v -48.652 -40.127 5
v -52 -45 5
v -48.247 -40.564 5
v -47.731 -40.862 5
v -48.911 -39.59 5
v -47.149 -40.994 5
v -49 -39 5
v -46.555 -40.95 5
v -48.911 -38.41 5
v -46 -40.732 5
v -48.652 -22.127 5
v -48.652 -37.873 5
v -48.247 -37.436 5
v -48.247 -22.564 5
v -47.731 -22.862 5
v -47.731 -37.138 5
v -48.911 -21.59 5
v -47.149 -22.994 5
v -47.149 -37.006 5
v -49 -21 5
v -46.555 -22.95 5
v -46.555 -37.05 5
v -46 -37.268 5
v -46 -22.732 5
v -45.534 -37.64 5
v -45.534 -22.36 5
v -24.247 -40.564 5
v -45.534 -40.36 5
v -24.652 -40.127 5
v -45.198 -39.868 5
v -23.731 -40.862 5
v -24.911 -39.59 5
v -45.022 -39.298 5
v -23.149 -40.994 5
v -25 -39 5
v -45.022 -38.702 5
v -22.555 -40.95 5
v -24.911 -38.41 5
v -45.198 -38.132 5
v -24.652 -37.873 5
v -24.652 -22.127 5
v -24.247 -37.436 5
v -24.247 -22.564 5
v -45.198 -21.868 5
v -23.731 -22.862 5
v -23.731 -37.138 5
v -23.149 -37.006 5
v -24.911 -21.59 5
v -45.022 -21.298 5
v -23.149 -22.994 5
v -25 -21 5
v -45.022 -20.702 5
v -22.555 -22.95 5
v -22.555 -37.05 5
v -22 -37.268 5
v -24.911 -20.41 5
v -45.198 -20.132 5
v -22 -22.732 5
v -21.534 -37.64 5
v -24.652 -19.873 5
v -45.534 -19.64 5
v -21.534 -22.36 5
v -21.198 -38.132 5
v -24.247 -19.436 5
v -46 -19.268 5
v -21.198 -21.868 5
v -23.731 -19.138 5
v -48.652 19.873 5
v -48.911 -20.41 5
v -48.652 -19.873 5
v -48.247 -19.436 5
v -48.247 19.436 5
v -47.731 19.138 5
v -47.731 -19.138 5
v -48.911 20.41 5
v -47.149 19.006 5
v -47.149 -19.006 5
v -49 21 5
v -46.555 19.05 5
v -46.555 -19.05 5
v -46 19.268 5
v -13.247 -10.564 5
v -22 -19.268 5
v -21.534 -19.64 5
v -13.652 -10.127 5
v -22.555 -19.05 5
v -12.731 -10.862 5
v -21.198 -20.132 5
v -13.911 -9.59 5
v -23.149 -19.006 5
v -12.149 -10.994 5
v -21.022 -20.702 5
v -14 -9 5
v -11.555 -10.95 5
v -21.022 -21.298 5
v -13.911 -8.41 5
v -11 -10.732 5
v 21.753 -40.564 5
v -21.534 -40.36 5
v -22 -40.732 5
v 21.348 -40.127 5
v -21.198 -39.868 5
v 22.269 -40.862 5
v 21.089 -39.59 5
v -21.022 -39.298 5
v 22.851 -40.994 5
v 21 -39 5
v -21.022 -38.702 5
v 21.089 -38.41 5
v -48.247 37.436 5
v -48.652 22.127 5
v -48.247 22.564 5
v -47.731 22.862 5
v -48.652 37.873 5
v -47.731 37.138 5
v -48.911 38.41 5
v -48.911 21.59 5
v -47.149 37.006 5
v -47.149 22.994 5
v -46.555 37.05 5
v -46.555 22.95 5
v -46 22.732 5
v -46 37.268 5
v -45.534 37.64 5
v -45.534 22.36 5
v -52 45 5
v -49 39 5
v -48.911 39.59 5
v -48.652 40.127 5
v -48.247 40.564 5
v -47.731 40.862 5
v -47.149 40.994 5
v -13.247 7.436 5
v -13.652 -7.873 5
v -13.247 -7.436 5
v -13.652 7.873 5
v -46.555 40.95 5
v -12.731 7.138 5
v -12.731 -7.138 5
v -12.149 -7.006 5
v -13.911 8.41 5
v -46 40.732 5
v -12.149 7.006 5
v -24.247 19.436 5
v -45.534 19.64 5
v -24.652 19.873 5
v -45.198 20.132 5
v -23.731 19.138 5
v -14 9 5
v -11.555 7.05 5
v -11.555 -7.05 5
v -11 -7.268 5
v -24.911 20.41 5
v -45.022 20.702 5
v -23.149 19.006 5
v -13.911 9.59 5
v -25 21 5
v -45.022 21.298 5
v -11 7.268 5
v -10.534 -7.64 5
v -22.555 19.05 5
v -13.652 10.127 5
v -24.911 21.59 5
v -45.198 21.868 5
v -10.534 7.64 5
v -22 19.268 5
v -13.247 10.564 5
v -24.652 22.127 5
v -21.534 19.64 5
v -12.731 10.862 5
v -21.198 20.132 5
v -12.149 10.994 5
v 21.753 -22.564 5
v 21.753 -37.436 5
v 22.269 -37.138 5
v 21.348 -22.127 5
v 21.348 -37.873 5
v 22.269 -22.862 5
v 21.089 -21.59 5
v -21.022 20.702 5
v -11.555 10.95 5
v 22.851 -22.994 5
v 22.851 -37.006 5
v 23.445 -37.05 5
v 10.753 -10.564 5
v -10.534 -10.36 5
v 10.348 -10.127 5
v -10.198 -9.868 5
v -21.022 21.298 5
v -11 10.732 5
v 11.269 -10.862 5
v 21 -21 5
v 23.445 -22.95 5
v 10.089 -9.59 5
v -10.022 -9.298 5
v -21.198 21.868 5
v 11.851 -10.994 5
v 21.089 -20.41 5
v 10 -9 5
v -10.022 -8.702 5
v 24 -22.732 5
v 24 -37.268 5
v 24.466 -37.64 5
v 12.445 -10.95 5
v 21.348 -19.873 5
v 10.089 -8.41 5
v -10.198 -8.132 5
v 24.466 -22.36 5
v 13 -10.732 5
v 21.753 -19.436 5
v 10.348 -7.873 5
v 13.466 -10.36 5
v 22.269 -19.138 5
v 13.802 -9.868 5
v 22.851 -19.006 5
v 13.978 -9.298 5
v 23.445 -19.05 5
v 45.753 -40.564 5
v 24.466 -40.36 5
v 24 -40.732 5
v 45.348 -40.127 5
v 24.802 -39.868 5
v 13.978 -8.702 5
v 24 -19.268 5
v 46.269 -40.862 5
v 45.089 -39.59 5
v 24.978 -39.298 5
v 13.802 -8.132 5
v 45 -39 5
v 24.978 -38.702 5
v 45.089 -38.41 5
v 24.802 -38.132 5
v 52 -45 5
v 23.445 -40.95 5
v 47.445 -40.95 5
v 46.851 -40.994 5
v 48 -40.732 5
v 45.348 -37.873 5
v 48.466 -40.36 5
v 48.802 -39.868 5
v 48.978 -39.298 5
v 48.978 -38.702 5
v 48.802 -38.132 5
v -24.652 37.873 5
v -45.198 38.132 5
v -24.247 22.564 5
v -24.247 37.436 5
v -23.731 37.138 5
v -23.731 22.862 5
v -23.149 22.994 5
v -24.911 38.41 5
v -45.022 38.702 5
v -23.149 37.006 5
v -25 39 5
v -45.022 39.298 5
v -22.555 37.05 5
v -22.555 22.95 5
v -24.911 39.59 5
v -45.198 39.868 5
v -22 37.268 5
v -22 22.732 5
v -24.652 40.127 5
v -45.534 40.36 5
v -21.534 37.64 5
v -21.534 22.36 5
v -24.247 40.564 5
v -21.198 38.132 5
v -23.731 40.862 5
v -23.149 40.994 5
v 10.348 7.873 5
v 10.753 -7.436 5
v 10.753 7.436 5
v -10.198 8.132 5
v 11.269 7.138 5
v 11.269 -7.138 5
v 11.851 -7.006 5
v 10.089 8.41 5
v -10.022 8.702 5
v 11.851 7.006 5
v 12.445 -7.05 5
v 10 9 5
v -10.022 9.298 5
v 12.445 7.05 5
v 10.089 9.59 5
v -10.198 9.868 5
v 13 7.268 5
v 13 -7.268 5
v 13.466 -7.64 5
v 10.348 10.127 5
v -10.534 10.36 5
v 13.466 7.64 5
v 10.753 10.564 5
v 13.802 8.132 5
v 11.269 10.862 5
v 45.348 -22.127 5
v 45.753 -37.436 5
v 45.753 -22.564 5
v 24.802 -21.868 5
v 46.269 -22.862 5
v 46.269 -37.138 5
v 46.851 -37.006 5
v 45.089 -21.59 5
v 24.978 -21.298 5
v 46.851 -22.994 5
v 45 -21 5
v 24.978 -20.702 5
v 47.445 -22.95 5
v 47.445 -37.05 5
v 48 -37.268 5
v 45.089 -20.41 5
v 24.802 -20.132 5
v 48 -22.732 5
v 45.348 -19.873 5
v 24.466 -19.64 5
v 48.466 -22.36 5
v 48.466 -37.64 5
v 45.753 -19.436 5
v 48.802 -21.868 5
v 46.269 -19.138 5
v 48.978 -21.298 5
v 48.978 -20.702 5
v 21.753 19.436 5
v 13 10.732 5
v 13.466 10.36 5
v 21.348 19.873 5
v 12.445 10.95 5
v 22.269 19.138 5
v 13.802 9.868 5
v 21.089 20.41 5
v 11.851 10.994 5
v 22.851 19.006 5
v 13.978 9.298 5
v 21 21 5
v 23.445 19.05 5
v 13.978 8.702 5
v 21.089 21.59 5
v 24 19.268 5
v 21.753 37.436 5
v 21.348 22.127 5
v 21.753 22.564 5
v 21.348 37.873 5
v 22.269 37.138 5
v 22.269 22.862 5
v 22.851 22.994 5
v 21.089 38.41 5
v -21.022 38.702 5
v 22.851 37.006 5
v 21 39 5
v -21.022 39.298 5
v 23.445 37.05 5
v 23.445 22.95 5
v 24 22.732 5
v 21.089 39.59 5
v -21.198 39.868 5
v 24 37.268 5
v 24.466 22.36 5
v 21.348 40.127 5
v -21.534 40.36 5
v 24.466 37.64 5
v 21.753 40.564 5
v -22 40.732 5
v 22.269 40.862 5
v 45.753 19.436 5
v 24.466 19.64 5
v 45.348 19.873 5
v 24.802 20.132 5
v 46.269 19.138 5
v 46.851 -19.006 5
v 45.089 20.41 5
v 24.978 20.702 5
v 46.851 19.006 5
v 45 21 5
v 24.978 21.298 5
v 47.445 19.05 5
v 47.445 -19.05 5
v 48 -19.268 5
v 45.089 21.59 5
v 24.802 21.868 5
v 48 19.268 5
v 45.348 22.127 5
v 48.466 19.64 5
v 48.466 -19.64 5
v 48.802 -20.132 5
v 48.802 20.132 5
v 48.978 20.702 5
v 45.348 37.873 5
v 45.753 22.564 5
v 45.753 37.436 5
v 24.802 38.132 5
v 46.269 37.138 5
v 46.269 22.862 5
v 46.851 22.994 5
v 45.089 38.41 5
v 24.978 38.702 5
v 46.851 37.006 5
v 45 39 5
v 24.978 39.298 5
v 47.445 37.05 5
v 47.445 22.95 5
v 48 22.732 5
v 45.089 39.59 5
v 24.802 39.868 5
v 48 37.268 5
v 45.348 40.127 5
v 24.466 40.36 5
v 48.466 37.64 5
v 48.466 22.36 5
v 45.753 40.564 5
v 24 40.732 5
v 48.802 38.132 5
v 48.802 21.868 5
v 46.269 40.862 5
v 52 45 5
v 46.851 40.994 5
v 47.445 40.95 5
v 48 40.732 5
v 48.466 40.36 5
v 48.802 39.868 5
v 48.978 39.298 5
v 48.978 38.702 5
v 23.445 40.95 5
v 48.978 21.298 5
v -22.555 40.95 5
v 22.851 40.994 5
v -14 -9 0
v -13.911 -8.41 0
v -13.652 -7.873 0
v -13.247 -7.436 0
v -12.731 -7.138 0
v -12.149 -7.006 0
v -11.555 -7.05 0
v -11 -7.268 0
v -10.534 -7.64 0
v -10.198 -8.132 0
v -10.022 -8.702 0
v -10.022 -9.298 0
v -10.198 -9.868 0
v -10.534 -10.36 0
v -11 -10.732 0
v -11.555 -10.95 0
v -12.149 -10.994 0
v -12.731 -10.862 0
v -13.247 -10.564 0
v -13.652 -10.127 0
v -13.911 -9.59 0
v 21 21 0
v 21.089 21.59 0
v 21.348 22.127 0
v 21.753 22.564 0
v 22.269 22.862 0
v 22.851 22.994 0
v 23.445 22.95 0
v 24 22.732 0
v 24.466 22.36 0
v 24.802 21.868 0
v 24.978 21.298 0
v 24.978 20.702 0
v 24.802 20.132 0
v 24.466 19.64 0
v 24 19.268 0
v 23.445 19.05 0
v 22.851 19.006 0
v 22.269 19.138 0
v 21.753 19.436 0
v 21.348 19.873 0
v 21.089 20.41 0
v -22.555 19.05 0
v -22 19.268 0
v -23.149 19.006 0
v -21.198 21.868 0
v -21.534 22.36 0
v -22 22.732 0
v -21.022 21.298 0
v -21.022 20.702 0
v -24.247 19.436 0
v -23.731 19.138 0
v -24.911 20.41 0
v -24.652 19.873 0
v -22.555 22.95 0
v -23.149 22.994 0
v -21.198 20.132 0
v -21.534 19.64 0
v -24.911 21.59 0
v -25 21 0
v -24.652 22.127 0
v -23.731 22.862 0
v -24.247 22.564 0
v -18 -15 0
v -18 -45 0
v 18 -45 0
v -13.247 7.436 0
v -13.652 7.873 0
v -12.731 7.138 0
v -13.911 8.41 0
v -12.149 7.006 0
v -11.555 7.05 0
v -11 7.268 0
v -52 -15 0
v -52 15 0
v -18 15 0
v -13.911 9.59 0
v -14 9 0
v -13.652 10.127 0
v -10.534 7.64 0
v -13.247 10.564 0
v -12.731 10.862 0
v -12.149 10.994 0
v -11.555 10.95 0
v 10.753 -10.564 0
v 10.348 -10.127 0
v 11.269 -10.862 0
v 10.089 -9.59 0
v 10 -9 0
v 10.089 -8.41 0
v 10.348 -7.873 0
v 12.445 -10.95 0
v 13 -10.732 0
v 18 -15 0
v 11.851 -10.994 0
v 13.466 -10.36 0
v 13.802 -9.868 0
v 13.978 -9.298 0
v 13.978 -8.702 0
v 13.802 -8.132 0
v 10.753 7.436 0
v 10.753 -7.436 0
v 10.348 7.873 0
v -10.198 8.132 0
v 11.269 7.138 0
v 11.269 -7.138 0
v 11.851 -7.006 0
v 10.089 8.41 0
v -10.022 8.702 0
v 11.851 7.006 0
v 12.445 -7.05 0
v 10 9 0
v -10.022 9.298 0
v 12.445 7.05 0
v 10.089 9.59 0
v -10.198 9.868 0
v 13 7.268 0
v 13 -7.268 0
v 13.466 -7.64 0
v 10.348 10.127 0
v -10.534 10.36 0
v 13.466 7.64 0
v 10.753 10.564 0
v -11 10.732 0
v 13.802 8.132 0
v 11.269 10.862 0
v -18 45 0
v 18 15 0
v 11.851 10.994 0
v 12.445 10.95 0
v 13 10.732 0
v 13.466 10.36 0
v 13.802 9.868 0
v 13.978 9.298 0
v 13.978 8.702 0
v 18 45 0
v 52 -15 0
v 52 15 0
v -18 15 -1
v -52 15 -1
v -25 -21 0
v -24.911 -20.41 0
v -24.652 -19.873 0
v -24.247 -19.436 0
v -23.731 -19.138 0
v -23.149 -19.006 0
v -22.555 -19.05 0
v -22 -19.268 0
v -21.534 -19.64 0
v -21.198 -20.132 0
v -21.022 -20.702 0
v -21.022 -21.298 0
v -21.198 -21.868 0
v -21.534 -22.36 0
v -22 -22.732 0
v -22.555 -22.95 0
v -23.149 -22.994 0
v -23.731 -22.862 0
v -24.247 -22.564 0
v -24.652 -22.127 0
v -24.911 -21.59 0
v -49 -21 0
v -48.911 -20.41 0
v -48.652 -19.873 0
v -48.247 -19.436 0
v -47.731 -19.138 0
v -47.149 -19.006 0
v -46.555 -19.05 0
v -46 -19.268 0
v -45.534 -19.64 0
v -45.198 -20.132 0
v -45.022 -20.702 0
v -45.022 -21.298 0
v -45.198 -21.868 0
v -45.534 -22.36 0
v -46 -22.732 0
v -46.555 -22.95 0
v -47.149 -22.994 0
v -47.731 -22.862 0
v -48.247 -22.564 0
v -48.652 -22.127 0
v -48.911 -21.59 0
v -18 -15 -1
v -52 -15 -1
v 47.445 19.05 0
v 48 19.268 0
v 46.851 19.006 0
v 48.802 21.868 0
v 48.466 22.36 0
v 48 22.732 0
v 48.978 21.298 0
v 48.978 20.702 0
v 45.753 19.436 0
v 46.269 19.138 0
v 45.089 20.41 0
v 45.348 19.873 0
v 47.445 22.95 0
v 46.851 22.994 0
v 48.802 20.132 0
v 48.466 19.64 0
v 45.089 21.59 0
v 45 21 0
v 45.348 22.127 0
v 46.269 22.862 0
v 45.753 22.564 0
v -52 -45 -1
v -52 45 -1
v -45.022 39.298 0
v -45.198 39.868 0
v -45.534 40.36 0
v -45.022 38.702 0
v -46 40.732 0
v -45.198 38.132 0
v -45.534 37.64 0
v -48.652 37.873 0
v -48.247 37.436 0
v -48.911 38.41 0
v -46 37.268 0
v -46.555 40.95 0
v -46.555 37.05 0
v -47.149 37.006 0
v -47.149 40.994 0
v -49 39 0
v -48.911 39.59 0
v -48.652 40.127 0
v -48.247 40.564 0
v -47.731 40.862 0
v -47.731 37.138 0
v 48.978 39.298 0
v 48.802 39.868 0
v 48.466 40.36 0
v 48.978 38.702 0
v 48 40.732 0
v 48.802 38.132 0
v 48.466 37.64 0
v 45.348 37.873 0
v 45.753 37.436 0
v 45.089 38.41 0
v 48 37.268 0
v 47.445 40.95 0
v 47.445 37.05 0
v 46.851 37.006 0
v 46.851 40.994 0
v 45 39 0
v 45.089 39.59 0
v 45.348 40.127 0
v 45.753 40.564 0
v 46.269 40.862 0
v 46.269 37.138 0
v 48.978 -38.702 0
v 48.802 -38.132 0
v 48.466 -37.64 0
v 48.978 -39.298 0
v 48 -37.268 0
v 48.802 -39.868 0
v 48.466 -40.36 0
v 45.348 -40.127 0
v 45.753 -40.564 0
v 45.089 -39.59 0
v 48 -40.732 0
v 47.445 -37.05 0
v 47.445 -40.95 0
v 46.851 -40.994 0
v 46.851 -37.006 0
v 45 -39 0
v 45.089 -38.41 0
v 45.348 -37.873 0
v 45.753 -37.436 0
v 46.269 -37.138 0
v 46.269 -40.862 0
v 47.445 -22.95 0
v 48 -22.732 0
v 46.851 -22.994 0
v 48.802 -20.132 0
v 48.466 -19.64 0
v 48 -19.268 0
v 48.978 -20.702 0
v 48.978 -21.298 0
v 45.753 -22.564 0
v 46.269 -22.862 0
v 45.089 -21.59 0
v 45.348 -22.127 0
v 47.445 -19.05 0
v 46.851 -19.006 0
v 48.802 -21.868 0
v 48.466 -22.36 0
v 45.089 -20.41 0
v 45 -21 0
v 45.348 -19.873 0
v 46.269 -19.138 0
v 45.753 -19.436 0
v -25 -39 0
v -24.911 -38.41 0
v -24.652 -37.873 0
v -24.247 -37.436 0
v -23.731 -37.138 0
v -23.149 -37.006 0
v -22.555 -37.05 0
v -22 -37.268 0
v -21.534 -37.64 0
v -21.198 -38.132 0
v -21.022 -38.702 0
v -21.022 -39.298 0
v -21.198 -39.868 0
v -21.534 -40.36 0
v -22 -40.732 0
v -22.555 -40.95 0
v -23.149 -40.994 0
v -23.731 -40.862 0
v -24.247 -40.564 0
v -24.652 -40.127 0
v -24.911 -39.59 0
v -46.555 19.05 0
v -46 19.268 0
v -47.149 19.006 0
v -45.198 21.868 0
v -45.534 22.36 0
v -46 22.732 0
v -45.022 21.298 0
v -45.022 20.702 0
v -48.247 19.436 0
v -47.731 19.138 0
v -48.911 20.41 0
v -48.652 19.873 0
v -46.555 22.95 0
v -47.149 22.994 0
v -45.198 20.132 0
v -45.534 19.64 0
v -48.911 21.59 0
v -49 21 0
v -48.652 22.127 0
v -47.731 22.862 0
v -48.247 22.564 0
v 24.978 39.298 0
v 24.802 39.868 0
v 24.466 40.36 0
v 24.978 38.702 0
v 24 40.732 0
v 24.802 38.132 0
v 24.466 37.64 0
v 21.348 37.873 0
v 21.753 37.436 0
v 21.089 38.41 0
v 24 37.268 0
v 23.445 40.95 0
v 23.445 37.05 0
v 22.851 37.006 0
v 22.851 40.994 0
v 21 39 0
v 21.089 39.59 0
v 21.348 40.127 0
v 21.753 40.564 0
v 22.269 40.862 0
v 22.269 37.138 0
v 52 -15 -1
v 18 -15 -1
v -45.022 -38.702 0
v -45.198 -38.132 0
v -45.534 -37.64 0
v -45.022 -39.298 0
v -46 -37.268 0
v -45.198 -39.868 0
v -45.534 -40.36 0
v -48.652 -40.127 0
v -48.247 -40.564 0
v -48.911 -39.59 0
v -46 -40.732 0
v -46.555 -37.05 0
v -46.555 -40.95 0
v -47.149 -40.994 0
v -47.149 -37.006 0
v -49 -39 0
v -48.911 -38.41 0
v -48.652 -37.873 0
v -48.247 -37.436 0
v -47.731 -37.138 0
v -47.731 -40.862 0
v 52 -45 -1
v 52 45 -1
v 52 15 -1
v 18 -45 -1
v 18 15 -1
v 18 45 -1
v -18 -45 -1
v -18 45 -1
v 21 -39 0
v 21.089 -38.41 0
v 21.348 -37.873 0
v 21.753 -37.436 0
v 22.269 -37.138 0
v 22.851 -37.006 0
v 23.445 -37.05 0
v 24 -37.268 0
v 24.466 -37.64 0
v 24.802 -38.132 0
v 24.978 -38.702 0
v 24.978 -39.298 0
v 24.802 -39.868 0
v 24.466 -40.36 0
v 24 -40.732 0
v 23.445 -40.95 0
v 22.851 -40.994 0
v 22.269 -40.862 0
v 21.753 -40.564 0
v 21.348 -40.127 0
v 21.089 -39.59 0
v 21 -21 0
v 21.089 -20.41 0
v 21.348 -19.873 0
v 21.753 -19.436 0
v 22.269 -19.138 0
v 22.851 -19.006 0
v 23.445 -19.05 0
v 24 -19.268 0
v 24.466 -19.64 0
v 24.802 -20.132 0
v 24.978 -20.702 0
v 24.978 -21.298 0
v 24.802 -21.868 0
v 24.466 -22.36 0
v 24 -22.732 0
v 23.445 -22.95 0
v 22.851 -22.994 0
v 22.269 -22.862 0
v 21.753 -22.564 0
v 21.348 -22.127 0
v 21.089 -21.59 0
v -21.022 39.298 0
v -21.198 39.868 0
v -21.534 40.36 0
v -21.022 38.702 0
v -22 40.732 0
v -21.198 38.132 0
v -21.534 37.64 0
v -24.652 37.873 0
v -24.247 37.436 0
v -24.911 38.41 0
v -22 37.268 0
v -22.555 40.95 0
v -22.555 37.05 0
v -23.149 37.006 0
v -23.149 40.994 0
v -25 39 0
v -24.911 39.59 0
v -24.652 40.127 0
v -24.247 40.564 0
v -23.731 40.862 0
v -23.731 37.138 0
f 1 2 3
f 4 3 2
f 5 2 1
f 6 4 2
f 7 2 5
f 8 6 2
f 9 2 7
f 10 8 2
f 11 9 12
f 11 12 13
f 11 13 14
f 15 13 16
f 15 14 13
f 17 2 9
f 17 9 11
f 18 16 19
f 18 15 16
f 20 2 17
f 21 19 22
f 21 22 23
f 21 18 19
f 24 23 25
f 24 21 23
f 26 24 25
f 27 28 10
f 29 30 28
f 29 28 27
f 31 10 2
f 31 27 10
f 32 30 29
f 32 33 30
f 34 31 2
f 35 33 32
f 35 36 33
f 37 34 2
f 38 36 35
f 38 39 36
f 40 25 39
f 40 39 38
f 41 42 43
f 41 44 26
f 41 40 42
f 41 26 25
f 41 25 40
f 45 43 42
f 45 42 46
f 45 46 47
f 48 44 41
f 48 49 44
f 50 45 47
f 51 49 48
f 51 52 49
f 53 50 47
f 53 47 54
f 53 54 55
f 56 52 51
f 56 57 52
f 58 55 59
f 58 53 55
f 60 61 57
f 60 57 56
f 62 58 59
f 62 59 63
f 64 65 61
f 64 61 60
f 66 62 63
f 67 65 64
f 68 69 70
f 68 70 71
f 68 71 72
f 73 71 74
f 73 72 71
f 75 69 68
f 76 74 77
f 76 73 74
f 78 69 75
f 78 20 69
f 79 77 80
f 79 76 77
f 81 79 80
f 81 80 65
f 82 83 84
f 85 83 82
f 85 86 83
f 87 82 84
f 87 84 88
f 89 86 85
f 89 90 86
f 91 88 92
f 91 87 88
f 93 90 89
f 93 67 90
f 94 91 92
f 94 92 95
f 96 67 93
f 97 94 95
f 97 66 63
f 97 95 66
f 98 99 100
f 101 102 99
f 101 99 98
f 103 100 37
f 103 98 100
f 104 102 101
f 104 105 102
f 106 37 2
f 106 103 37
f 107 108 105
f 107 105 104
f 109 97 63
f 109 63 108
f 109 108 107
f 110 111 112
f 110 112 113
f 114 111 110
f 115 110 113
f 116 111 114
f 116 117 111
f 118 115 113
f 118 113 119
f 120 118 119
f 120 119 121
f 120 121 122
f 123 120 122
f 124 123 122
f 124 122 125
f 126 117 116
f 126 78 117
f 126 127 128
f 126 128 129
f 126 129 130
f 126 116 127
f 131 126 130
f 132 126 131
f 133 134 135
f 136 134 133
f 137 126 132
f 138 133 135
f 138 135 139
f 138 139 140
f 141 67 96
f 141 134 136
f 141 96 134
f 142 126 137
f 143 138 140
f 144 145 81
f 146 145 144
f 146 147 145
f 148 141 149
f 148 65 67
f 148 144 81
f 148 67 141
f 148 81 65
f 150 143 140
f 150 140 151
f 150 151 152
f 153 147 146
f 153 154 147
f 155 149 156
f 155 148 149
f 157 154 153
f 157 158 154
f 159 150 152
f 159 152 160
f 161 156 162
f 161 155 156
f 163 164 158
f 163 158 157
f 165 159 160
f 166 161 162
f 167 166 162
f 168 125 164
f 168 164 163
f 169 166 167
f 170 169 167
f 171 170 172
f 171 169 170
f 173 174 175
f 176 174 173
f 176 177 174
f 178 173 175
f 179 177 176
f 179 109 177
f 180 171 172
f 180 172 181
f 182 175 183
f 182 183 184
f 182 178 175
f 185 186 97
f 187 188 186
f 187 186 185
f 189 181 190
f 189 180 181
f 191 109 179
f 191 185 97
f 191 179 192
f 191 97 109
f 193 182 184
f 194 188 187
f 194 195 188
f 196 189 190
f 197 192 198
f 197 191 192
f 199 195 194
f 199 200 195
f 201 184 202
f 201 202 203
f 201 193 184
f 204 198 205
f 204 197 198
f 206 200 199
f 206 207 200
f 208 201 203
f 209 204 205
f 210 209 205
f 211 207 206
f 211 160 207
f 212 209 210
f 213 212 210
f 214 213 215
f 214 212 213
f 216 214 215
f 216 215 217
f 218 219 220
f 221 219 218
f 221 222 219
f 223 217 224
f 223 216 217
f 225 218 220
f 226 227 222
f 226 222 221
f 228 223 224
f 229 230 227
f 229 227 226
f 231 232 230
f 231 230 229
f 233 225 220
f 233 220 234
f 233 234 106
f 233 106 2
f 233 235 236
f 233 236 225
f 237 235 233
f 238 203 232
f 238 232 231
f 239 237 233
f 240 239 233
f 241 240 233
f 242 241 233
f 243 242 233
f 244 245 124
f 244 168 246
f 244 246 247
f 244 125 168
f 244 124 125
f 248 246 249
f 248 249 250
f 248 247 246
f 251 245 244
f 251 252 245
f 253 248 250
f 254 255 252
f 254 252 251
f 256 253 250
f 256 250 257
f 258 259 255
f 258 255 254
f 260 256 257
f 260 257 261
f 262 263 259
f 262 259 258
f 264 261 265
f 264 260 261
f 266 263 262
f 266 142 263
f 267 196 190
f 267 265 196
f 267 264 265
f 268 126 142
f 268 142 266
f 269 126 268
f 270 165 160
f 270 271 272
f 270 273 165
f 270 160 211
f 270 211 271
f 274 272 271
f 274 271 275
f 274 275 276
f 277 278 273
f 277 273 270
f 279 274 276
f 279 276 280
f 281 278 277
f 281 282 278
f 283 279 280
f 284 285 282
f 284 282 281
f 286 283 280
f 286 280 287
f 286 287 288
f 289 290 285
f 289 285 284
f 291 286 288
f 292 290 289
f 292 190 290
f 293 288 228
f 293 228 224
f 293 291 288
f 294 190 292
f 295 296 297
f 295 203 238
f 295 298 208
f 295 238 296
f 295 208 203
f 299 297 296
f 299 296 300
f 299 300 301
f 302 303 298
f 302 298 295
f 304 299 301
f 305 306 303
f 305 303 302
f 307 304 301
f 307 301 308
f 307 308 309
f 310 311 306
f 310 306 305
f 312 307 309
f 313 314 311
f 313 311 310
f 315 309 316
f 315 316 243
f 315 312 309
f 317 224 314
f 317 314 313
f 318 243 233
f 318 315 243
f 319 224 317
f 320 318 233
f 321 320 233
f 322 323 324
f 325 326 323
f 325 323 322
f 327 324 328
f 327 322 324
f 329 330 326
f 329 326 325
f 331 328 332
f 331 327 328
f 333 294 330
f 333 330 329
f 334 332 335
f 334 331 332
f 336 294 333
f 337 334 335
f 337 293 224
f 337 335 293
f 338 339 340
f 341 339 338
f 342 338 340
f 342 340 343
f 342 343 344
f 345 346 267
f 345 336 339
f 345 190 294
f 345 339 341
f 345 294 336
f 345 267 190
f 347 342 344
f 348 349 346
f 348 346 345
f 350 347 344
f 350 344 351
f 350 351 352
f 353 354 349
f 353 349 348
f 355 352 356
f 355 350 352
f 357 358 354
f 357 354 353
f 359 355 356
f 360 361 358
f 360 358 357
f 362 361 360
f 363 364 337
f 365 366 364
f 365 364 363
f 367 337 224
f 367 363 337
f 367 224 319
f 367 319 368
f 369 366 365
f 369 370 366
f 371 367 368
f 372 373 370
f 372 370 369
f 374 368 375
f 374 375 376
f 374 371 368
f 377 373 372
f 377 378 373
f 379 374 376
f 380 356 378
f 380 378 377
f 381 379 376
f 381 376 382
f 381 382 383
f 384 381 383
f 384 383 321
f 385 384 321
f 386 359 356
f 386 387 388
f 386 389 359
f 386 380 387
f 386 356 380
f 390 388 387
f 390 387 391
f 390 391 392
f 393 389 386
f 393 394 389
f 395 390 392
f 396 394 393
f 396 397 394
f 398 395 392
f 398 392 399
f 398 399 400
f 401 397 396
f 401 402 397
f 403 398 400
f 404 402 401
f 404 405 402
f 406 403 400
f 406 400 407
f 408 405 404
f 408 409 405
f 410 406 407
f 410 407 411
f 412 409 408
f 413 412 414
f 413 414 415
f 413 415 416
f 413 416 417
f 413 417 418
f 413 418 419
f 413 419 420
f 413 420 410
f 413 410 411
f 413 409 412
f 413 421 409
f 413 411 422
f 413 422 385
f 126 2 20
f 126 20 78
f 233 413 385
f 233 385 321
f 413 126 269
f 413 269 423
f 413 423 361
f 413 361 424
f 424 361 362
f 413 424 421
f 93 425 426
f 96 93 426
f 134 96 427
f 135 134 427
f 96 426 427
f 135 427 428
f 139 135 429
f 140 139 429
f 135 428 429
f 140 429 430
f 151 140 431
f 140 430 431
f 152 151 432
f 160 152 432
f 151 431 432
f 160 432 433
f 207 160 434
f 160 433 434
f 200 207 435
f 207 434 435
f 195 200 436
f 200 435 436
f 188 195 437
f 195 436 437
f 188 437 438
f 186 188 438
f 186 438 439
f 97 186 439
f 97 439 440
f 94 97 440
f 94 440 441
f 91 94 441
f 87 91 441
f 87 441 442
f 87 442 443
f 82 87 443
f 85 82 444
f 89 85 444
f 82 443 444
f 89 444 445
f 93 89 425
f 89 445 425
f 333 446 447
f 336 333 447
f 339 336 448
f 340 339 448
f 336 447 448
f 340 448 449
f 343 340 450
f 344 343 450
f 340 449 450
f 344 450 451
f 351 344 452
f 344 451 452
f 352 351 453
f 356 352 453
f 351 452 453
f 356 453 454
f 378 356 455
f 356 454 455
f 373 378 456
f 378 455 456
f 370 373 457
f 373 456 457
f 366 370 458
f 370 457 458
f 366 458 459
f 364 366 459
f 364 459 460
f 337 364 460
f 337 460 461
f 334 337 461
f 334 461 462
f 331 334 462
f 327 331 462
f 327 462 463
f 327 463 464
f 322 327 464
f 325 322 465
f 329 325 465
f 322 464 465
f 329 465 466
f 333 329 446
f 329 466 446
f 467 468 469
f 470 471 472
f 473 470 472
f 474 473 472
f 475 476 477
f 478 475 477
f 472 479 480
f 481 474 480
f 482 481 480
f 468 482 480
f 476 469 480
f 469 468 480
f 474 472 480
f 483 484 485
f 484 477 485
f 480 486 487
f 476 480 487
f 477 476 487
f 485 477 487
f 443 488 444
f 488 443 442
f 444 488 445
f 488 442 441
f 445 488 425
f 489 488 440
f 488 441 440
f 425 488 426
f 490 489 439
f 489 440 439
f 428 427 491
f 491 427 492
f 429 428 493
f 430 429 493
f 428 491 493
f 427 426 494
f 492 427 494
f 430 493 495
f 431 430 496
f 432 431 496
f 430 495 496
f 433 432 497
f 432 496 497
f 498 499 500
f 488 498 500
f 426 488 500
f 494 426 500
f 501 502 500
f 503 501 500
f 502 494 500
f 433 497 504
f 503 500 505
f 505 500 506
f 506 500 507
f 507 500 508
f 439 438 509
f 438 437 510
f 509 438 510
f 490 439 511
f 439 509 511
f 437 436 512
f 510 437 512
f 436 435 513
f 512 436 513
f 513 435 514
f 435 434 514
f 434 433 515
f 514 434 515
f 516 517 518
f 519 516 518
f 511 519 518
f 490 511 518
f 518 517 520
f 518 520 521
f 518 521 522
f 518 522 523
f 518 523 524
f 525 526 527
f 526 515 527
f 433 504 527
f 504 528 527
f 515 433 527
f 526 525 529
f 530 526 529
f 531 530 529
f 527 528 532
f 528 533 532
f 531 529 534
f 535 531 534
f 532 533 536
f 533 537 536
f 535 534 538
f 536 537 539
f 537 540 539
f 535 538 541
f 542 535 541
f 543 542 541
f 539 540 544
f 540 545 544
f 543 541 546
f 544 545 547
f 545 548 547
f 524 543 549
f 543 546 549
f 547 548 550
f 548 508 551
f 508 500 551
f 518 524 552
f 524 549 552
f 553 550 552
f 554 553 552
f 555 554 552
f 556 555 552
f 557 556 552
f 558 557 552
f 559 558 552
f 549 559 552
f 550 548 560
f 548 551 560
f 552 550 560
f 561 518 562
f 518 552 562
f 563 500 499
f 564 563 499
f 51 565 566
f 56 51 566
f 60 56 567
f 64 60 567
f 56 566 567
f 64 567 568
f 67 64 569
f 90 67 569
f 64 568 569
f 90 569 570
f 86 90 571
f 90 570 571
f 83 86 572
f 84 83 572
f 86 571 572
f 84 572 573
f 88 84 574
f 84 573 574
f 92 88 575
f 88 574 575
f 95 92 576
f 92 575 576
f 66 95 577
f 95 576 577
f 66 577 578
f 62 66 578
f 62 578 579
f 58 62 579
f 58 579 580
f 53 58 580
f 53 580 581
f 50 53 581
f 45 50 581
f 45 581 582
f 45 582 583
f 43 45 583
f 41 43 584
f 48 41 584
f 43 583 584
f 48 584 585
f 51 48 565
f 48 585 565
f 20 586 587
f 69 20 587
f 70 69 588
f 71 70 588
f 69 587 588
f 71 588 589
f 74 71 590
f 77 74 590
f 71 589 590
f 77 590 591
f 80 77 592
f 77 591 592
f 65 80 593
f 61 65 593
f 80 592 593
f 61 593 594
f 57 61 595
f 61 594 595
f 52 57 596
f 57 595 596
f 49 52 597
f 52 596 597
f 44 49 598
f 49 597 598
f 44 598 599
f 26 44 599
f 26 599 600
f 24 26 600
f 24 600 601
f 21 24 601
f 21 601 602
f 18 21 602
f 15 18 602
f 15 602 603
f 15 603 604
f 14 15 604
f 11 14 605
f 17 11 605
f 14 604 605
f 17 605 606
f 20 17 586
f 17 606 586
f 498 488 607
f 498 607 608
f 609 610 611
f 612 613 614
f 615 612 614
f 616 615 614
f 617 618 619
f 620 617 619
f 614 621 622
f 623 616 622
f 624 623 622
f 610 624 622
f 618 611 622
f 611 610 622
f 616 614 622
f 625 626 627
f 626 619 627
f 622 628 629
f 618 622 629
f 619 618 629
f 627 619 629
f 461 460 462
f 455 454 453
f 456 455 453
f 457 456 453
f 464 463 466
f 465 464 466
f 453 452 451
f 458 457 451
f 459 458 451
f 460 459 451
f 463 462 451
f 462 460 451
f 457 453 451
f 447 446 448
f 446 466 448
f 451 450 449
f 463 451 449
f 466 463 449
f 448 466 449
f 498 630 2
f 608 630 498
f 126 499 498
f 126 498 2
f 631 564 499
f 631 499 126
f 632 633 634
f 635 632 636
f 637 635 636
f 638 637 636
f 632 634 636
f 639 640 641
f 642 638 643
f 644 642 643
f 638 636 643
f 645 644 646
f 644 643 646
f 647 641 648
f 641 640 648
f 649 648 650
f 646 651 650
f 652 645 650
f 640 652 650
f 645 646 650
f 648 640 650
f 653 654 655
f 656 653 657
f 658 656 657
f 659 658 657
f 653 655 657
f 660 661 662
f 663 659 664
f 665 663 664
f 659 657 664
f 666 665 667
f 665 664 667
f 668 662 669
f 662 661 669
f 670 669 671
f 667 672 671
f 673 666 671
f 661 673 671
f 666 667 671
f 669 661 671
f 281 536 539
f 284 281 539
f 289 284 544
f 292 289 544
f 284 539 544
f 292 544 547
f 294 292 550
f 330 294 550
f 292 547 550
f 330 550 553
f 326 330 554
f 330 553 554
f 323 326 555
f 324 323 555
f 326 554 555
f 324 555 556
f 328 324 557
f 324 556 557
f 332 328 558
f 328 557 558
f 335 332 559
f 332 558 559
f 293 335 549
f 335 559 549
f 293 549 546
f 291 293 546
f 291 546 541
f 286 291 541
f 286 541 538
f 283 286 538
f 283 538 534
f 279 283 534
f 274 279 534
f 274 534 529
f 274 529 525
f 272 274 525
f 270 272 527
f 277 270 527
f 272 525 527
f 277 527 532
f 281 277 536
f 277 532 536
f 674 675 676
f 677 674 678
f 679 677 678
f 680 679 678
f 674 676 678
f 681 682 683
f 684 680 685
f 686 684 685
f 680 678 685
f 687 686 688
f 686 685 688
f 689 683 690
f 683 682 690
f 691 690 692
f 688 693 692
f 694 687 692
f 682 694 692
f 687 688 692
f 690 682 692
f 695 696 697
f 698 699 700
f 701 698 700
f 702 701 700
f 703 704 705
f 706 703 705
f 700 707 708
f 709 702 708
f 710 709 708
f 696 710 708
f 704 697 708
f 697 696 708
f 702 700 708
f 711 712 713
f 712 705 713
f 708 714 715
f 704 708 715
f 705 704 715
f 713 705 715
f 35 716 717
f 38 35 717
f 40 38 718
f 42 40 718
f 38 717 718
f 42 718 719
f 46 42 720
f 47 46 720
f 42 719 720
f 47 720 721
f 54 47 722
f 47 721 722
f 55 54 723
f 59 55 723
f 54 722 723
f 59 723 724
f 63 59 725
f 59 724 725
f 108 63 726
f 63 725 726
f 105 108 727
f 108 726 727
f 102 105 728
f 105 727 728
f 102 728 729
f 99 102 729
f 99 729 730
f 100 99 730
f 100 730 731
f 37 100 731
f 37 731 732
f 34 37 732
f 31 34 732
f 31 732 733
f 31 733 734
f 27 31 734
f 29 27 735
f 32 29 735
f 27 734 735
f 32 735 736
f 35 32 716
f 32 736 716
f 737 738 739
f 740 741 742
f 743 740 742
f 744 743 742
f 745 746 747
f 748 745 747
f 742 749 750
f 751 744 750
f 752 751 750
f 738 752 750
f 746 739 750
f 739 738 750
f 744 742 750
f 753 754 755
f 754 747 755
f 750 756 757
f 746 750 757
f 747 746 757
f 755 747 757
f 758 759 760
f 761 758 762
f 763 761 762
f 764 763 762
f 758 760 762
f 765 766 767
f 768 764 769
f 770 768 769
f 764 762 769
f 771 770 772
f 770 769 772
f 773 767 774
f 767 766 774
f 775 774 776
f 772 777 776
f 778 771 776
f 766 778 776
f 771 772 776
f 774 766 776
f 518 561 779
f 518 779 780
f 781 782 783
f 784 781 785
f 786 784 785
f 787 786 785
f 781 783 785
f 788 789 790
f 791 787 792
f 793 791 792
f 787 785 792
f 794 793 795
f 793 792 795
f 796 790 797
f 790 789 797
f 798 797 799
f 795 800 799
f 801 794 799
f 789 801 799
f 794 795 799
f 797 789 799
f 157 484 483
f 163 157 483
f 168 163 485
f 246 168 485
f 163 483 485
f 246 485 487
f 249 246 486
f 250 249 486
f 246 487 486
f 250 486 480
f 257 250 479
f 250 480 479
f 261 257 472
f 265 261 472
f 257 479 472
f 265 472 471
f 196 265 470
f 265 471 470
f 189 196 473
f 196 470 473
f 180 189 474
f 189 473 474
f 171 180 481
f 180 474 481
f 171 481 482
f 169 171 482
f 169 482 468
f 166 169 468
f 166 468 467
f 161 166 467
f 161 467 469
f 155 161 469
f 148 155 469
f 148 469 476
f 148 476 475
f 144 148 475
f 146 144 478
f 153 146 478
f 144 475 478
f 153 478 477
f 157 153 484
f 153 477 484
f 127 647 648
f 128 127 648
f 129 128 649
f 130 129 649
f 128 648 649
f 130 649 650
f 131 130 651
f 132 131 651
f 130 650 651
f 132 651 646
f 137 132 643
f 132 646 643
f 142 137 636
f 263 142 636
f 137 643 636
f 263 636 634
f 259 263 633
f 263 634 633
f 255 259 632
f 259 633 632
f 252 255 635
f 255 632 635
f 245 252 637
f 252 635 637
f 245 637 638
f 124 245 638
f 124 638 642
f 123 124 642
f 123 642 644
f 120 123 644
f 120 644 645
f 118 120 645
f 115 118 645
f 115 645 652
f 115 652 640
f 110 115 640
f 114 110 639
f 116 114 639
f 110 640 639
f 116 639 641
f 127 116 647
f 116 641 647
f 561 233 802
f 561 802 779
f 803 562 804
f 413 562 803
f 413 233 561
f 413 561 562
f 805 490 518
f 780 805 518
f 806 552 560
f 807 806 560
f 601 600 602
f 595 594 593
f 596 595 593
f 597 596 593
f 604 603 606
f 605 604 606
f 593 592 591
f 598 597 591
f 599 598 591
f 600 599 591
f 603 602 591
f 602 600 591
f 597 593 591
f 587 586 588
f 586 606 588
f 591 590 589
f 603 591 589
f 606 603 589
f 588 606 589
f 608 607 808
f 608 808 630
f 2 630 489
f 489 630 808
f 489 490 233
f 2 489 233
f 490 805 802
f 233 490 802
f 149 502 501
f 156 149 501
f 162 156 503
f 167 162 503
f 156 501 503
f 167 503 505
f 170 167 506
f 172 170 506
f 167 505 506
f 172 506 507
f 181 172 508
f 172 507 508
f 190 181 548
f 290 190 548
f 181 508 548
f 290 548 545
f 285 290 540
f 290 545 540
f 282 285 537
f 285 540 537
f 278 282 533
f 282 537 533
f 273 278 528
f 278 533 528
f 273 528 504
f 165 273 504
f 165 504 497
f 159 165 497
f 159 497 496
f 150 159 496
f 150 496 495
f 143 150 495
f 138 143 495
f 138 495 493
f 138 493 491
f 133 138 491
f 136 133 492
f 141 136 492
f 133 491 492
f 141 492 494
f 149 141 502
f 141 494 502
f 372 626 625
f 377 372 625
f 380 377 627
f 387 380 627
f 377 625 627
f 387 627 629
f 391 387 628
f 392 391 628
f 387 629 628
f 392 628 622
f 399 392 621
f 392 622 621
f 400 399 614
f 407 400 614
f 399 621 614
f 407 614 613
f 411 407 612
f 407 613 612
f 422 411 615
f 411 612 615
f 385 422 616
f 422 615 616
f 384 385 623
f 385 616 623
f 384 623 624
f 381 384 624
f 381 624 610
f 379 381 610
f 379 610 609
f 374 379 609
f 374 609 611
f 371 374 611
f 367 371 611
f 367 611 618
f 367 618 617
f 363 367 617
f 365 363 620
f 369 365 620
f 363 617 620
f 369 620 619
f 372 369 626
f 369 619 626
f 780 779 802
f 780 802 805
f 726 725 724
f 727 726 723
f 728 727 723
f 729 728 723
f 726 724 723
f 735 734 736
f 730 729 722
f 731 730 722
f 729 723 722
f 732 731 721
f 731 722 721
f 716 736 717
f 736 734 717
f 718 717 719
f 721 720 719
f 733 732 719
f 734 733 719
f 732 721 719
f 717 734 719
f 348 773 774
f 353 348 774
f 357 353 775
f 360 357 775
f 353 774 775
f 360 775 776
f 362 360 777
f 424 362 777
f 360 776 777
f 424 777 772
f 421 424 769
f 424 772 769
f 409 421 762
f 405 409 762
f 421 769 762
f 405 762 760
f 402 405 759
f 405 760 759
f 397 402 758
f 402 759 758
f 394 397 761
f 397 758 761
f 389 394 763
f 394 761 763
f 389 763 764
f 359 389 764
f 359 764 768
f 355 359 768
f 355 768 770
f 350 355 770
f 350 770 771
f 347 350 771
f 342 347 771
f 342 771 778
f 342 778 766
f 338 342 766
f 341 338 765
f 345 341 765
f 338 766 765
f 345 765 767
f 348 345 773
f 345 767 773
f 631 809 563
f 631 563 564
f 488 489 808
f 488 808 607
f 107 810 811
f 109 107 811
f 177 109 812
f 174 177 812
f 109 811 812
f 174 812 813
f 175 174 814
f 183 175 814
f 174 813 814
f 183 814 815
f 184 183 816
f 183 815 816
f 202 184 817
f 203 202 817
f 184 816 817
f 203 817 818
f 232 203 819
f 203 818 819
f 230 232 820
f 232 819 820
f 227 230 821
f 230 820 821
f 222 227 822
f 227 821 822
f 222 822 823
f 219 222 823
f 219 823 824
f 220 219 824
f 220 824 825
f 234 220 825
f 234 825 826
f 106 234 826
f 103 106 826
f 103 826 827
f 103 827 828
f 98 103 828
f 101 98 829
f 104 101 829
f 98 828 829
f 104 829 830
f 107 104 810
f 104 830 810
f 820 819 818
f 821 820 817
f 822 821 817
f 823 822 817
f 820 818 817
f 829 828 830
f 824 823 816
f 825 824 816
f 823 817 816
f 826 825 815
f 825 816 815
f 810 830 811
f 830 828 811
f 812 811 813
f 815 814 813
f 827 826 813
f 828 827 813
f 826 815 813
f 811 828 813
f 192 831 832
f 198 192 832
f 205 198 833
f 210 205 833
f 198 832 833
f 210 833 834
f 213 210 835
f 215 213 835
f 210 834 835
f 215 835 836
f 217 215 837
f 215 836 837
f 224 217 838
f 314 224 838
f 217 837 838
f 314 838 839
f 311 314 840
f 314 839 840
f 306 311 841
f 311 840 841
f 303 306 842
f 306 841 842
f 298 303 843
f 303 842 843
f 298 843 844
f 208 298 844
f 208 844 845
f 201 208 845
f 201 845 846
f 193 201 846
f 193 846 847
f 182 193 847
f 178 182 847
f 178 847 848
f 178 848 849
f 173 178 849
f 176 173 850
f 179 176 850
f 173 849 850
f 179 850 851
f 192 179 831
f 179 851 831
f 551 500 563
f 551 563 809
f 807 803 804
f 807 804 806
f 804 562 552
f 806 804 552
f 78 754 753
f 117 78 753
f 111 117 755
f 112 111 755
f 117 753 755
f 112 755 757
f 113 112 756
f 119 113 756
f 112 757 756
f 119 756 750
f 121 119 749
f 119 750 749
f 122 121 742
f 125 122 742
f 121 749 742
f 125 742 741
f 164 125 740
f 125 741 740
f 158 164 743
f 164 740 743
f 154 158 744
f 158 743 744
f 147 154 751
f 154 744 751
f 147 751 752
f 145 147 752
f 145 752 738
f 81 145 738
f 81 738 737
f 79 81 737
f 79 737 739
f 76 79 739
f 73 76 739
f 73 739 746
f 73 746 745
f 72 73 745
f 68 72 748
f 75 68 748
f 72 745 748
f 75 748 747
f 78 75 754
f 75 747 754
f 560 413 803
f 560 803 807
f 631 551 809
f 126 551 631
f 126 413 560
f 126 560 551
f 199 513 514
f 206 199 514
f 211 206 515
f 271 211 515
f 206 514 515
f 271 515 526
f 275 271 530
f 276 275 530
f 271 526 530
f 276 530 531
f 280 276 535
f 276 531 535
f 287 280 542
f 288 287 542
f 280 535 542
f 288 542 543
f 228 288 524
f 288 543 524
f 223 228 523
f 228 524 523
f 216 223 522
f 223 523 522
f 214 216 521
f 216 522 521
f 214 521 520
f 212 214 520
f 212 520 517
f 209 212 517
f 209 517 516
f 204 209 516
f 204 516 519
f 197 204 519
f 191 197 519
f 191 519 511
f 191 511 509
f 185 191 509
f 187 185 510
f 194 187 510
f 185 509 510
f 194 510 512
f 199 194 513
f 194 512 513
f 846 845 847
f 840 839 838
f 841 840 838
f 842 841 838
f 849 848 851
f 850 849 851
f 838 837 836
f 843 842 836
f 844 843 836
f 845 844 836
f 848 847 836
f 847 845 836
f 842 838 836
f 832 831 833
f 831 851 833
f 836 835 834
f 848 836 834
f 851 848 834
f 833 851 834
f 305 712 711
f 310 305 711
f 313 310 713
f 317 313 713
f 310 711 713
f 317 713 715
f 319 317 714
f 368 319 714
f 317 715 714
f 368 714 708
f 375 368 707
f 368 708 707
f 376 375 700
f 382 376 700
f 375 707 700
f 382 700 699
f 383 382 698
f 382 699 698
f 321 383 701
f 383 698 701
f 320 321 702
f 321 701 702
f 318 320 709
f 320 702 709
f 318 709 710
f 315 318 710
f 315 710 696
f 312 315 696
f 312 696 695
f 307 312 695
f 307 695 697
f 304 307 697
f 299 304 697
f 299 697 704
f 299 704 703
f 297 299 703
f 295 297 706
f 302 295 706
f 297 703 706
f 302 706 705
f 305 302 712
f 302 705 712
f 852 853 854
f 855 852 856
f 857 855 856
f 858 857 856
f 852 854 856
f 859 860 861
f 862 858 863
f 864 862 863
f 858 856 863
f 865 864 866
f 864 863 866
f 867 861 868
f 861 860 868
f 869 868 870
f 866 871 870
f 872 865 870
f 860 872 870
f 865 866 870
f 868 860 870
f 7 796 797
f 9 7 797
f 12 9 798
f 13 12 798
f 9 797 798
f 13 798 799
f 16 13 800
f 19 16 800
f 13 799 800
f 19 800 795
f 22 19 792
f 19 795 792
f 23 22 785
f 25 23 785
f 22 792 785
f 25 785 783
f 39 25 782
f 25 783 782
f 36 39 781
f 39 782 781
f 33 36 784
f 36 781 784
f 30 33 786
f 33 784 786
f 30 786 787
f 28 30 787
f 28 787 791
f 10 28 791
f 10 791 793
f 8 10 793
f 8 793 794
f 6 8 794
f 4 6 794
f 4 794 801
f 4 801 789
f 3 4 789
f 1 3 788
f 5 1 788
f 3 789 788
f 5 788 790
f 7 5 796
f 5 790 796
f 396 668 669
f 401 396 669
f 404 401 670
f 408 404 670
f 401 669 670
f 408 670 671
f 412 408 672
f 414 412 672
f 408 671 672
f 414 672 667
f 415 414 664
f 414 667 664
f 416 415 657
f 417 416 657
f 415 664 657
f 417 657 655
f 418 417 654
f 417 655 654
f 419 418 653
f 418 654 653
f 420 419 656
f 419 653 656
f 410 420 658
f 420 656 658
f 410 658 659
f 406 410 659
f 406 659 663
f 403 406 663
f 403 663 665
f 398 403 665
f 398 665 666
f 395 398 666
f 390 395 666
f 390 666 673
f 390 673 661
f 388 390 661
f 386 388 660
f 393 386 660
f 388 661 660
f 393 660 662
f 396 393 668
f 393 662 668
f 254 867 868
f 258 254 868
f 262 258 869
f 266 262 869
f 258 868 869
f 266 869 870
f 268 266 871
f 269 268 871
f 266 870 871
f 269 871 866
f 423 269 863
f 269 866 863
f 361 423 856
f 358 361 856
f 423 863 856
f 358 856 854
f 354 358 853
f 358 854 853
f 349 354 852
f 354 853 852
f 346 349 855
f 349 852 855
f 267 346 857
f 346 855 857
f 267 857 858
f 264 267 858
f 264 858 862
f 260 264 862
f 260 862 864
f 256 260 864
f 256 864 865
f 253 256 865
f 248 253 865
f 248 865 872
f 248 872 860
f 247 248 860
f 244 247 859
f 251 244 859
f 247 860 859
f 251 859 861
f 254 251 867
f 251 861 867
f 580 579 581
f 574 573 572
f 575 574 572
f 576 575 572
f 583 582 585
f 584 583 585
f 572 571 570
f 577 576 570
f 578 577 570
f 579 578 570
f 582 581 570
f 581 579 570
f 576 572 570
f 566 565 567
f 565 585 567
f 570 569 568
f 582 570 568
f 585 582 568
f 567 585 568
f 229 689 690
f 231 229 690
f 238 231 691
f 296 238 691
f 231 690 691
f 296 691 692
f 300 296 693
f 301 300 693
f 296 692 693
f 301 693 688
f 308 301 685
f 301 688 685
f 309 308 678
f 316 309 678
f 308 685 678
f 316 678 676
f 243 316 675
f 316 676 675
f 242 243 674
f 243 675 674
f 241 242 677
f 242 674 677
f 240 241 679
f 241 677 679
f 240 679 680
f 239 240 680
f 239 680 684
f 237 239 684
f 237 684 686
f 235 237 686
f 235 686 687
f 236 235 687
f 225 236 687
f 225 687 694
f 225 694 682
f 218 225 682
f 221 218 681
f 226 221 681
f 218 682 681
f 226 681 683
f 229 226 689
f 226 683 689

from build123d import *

# Parameters (mm, degrees)
CROQUIS1_W              = 104
CROQUIS1_H              = 90
SALIENTE_EXTRUIR1_DEPTH = 5
CROQUIS3_W              = 34
CROQUIS3_H              = 30
SALIENTE_EXTRUIR2_DEPTH = 1
SKETCH1_R               = 2
CUT_EXTRUDE1_DEPTH      = 5


with BuildPart() as part:
    # Croquis1 → Saliente-Extruir1 (new body)
    with BuildSketch(Plane.XY):
        Rectangle(CROQUIS1_W, CROQUIS1_H)
    extrude(amount=SALIENTE_EXTRUIR1_DEPTH)

    # Croquis3 → Saliente-Extruir2 (add)
    with BuildSketch(Plane(origin=(0, 0, 0), x_dir=(-1, 0, 0), z_dir=(0, 0, -1))):
        with Locations((-35, 30)):
            Rectangle(CROQUIS3_W, CROQUIS3_H)
        with Locations((-35, -30)):
            Rectangle(CROQUIS3_W, CROQUIS3_H)
        with Locations((35, 30)):
            Rectangle(CROQUIS3_W, CROQUIS3_H)
        with Locations((35, -30)):
            Rectangle(CROQUIS3_W, CROQUIS3_H)
    extrude(amount=SALIENTE_EXTRUIR2_DEPTH)

    # Sketch1 → Cut-Extrude1 (cut)
    with BuildSketch(Plane(origin=(0, 0, 0), x_dir=(-1, 0, 0), z_dir=(0, 0, -1))):
        with Locations((-47, 39)):
            Circle(SKETCH1_R)
        with Locations((-23, 39)):
            Circle(SKETCH1_R)
        with Locations((-47, 21)):
            Circle(SKETCH1_R)
        with Locations((-23, 21)):
            Circle(SKETCH1_R)
        with Locations((23, 39)):
            Circle(SKETCH1_R)
        with Locations((23, 21)):
            Circle(SKETCH1_R)
        with Locations((47, 21)):
            Circle(SKETCH1_R)
        with Locations((47, 39)):
            Circle(SKETCH1_R)
        with Locations((23, -21)):
            Circle(SKETCH1_R)
        with Locations((23, -39)):
            Circle(SKETCH1_R)
        with Locations((47, -39)):
            Circle(SKETCH1_R)
        with Locations((47, -21)):
            Circle(SKETCH1_R)
        with Locations((-23, -21)):
            Circle(SKETCH1_R)
        with Locations((-23, -39)):
            Circle(SKETCH1_R)
        with Locations((-47, -39)):
            Circle(SKETCH1_R)
        with Locations((-47, -21)):
            Circle(SKETCH1_R)
        with Locations((-12, 9)):
            Circle(SKETCH1_R)
        with Locations((-12, -9)):
            Circle(SKETCH1_R)
        with Locations((12, -9)):
            Circle(SKETCH1_R)
        with Locations((12, 9)):
            Circle(SKETCH1_R)
    extrude(amount=-CUT_EXTRUDE1_DEPTH, mode=Mode.SUBTRACT)


solid = part.part
